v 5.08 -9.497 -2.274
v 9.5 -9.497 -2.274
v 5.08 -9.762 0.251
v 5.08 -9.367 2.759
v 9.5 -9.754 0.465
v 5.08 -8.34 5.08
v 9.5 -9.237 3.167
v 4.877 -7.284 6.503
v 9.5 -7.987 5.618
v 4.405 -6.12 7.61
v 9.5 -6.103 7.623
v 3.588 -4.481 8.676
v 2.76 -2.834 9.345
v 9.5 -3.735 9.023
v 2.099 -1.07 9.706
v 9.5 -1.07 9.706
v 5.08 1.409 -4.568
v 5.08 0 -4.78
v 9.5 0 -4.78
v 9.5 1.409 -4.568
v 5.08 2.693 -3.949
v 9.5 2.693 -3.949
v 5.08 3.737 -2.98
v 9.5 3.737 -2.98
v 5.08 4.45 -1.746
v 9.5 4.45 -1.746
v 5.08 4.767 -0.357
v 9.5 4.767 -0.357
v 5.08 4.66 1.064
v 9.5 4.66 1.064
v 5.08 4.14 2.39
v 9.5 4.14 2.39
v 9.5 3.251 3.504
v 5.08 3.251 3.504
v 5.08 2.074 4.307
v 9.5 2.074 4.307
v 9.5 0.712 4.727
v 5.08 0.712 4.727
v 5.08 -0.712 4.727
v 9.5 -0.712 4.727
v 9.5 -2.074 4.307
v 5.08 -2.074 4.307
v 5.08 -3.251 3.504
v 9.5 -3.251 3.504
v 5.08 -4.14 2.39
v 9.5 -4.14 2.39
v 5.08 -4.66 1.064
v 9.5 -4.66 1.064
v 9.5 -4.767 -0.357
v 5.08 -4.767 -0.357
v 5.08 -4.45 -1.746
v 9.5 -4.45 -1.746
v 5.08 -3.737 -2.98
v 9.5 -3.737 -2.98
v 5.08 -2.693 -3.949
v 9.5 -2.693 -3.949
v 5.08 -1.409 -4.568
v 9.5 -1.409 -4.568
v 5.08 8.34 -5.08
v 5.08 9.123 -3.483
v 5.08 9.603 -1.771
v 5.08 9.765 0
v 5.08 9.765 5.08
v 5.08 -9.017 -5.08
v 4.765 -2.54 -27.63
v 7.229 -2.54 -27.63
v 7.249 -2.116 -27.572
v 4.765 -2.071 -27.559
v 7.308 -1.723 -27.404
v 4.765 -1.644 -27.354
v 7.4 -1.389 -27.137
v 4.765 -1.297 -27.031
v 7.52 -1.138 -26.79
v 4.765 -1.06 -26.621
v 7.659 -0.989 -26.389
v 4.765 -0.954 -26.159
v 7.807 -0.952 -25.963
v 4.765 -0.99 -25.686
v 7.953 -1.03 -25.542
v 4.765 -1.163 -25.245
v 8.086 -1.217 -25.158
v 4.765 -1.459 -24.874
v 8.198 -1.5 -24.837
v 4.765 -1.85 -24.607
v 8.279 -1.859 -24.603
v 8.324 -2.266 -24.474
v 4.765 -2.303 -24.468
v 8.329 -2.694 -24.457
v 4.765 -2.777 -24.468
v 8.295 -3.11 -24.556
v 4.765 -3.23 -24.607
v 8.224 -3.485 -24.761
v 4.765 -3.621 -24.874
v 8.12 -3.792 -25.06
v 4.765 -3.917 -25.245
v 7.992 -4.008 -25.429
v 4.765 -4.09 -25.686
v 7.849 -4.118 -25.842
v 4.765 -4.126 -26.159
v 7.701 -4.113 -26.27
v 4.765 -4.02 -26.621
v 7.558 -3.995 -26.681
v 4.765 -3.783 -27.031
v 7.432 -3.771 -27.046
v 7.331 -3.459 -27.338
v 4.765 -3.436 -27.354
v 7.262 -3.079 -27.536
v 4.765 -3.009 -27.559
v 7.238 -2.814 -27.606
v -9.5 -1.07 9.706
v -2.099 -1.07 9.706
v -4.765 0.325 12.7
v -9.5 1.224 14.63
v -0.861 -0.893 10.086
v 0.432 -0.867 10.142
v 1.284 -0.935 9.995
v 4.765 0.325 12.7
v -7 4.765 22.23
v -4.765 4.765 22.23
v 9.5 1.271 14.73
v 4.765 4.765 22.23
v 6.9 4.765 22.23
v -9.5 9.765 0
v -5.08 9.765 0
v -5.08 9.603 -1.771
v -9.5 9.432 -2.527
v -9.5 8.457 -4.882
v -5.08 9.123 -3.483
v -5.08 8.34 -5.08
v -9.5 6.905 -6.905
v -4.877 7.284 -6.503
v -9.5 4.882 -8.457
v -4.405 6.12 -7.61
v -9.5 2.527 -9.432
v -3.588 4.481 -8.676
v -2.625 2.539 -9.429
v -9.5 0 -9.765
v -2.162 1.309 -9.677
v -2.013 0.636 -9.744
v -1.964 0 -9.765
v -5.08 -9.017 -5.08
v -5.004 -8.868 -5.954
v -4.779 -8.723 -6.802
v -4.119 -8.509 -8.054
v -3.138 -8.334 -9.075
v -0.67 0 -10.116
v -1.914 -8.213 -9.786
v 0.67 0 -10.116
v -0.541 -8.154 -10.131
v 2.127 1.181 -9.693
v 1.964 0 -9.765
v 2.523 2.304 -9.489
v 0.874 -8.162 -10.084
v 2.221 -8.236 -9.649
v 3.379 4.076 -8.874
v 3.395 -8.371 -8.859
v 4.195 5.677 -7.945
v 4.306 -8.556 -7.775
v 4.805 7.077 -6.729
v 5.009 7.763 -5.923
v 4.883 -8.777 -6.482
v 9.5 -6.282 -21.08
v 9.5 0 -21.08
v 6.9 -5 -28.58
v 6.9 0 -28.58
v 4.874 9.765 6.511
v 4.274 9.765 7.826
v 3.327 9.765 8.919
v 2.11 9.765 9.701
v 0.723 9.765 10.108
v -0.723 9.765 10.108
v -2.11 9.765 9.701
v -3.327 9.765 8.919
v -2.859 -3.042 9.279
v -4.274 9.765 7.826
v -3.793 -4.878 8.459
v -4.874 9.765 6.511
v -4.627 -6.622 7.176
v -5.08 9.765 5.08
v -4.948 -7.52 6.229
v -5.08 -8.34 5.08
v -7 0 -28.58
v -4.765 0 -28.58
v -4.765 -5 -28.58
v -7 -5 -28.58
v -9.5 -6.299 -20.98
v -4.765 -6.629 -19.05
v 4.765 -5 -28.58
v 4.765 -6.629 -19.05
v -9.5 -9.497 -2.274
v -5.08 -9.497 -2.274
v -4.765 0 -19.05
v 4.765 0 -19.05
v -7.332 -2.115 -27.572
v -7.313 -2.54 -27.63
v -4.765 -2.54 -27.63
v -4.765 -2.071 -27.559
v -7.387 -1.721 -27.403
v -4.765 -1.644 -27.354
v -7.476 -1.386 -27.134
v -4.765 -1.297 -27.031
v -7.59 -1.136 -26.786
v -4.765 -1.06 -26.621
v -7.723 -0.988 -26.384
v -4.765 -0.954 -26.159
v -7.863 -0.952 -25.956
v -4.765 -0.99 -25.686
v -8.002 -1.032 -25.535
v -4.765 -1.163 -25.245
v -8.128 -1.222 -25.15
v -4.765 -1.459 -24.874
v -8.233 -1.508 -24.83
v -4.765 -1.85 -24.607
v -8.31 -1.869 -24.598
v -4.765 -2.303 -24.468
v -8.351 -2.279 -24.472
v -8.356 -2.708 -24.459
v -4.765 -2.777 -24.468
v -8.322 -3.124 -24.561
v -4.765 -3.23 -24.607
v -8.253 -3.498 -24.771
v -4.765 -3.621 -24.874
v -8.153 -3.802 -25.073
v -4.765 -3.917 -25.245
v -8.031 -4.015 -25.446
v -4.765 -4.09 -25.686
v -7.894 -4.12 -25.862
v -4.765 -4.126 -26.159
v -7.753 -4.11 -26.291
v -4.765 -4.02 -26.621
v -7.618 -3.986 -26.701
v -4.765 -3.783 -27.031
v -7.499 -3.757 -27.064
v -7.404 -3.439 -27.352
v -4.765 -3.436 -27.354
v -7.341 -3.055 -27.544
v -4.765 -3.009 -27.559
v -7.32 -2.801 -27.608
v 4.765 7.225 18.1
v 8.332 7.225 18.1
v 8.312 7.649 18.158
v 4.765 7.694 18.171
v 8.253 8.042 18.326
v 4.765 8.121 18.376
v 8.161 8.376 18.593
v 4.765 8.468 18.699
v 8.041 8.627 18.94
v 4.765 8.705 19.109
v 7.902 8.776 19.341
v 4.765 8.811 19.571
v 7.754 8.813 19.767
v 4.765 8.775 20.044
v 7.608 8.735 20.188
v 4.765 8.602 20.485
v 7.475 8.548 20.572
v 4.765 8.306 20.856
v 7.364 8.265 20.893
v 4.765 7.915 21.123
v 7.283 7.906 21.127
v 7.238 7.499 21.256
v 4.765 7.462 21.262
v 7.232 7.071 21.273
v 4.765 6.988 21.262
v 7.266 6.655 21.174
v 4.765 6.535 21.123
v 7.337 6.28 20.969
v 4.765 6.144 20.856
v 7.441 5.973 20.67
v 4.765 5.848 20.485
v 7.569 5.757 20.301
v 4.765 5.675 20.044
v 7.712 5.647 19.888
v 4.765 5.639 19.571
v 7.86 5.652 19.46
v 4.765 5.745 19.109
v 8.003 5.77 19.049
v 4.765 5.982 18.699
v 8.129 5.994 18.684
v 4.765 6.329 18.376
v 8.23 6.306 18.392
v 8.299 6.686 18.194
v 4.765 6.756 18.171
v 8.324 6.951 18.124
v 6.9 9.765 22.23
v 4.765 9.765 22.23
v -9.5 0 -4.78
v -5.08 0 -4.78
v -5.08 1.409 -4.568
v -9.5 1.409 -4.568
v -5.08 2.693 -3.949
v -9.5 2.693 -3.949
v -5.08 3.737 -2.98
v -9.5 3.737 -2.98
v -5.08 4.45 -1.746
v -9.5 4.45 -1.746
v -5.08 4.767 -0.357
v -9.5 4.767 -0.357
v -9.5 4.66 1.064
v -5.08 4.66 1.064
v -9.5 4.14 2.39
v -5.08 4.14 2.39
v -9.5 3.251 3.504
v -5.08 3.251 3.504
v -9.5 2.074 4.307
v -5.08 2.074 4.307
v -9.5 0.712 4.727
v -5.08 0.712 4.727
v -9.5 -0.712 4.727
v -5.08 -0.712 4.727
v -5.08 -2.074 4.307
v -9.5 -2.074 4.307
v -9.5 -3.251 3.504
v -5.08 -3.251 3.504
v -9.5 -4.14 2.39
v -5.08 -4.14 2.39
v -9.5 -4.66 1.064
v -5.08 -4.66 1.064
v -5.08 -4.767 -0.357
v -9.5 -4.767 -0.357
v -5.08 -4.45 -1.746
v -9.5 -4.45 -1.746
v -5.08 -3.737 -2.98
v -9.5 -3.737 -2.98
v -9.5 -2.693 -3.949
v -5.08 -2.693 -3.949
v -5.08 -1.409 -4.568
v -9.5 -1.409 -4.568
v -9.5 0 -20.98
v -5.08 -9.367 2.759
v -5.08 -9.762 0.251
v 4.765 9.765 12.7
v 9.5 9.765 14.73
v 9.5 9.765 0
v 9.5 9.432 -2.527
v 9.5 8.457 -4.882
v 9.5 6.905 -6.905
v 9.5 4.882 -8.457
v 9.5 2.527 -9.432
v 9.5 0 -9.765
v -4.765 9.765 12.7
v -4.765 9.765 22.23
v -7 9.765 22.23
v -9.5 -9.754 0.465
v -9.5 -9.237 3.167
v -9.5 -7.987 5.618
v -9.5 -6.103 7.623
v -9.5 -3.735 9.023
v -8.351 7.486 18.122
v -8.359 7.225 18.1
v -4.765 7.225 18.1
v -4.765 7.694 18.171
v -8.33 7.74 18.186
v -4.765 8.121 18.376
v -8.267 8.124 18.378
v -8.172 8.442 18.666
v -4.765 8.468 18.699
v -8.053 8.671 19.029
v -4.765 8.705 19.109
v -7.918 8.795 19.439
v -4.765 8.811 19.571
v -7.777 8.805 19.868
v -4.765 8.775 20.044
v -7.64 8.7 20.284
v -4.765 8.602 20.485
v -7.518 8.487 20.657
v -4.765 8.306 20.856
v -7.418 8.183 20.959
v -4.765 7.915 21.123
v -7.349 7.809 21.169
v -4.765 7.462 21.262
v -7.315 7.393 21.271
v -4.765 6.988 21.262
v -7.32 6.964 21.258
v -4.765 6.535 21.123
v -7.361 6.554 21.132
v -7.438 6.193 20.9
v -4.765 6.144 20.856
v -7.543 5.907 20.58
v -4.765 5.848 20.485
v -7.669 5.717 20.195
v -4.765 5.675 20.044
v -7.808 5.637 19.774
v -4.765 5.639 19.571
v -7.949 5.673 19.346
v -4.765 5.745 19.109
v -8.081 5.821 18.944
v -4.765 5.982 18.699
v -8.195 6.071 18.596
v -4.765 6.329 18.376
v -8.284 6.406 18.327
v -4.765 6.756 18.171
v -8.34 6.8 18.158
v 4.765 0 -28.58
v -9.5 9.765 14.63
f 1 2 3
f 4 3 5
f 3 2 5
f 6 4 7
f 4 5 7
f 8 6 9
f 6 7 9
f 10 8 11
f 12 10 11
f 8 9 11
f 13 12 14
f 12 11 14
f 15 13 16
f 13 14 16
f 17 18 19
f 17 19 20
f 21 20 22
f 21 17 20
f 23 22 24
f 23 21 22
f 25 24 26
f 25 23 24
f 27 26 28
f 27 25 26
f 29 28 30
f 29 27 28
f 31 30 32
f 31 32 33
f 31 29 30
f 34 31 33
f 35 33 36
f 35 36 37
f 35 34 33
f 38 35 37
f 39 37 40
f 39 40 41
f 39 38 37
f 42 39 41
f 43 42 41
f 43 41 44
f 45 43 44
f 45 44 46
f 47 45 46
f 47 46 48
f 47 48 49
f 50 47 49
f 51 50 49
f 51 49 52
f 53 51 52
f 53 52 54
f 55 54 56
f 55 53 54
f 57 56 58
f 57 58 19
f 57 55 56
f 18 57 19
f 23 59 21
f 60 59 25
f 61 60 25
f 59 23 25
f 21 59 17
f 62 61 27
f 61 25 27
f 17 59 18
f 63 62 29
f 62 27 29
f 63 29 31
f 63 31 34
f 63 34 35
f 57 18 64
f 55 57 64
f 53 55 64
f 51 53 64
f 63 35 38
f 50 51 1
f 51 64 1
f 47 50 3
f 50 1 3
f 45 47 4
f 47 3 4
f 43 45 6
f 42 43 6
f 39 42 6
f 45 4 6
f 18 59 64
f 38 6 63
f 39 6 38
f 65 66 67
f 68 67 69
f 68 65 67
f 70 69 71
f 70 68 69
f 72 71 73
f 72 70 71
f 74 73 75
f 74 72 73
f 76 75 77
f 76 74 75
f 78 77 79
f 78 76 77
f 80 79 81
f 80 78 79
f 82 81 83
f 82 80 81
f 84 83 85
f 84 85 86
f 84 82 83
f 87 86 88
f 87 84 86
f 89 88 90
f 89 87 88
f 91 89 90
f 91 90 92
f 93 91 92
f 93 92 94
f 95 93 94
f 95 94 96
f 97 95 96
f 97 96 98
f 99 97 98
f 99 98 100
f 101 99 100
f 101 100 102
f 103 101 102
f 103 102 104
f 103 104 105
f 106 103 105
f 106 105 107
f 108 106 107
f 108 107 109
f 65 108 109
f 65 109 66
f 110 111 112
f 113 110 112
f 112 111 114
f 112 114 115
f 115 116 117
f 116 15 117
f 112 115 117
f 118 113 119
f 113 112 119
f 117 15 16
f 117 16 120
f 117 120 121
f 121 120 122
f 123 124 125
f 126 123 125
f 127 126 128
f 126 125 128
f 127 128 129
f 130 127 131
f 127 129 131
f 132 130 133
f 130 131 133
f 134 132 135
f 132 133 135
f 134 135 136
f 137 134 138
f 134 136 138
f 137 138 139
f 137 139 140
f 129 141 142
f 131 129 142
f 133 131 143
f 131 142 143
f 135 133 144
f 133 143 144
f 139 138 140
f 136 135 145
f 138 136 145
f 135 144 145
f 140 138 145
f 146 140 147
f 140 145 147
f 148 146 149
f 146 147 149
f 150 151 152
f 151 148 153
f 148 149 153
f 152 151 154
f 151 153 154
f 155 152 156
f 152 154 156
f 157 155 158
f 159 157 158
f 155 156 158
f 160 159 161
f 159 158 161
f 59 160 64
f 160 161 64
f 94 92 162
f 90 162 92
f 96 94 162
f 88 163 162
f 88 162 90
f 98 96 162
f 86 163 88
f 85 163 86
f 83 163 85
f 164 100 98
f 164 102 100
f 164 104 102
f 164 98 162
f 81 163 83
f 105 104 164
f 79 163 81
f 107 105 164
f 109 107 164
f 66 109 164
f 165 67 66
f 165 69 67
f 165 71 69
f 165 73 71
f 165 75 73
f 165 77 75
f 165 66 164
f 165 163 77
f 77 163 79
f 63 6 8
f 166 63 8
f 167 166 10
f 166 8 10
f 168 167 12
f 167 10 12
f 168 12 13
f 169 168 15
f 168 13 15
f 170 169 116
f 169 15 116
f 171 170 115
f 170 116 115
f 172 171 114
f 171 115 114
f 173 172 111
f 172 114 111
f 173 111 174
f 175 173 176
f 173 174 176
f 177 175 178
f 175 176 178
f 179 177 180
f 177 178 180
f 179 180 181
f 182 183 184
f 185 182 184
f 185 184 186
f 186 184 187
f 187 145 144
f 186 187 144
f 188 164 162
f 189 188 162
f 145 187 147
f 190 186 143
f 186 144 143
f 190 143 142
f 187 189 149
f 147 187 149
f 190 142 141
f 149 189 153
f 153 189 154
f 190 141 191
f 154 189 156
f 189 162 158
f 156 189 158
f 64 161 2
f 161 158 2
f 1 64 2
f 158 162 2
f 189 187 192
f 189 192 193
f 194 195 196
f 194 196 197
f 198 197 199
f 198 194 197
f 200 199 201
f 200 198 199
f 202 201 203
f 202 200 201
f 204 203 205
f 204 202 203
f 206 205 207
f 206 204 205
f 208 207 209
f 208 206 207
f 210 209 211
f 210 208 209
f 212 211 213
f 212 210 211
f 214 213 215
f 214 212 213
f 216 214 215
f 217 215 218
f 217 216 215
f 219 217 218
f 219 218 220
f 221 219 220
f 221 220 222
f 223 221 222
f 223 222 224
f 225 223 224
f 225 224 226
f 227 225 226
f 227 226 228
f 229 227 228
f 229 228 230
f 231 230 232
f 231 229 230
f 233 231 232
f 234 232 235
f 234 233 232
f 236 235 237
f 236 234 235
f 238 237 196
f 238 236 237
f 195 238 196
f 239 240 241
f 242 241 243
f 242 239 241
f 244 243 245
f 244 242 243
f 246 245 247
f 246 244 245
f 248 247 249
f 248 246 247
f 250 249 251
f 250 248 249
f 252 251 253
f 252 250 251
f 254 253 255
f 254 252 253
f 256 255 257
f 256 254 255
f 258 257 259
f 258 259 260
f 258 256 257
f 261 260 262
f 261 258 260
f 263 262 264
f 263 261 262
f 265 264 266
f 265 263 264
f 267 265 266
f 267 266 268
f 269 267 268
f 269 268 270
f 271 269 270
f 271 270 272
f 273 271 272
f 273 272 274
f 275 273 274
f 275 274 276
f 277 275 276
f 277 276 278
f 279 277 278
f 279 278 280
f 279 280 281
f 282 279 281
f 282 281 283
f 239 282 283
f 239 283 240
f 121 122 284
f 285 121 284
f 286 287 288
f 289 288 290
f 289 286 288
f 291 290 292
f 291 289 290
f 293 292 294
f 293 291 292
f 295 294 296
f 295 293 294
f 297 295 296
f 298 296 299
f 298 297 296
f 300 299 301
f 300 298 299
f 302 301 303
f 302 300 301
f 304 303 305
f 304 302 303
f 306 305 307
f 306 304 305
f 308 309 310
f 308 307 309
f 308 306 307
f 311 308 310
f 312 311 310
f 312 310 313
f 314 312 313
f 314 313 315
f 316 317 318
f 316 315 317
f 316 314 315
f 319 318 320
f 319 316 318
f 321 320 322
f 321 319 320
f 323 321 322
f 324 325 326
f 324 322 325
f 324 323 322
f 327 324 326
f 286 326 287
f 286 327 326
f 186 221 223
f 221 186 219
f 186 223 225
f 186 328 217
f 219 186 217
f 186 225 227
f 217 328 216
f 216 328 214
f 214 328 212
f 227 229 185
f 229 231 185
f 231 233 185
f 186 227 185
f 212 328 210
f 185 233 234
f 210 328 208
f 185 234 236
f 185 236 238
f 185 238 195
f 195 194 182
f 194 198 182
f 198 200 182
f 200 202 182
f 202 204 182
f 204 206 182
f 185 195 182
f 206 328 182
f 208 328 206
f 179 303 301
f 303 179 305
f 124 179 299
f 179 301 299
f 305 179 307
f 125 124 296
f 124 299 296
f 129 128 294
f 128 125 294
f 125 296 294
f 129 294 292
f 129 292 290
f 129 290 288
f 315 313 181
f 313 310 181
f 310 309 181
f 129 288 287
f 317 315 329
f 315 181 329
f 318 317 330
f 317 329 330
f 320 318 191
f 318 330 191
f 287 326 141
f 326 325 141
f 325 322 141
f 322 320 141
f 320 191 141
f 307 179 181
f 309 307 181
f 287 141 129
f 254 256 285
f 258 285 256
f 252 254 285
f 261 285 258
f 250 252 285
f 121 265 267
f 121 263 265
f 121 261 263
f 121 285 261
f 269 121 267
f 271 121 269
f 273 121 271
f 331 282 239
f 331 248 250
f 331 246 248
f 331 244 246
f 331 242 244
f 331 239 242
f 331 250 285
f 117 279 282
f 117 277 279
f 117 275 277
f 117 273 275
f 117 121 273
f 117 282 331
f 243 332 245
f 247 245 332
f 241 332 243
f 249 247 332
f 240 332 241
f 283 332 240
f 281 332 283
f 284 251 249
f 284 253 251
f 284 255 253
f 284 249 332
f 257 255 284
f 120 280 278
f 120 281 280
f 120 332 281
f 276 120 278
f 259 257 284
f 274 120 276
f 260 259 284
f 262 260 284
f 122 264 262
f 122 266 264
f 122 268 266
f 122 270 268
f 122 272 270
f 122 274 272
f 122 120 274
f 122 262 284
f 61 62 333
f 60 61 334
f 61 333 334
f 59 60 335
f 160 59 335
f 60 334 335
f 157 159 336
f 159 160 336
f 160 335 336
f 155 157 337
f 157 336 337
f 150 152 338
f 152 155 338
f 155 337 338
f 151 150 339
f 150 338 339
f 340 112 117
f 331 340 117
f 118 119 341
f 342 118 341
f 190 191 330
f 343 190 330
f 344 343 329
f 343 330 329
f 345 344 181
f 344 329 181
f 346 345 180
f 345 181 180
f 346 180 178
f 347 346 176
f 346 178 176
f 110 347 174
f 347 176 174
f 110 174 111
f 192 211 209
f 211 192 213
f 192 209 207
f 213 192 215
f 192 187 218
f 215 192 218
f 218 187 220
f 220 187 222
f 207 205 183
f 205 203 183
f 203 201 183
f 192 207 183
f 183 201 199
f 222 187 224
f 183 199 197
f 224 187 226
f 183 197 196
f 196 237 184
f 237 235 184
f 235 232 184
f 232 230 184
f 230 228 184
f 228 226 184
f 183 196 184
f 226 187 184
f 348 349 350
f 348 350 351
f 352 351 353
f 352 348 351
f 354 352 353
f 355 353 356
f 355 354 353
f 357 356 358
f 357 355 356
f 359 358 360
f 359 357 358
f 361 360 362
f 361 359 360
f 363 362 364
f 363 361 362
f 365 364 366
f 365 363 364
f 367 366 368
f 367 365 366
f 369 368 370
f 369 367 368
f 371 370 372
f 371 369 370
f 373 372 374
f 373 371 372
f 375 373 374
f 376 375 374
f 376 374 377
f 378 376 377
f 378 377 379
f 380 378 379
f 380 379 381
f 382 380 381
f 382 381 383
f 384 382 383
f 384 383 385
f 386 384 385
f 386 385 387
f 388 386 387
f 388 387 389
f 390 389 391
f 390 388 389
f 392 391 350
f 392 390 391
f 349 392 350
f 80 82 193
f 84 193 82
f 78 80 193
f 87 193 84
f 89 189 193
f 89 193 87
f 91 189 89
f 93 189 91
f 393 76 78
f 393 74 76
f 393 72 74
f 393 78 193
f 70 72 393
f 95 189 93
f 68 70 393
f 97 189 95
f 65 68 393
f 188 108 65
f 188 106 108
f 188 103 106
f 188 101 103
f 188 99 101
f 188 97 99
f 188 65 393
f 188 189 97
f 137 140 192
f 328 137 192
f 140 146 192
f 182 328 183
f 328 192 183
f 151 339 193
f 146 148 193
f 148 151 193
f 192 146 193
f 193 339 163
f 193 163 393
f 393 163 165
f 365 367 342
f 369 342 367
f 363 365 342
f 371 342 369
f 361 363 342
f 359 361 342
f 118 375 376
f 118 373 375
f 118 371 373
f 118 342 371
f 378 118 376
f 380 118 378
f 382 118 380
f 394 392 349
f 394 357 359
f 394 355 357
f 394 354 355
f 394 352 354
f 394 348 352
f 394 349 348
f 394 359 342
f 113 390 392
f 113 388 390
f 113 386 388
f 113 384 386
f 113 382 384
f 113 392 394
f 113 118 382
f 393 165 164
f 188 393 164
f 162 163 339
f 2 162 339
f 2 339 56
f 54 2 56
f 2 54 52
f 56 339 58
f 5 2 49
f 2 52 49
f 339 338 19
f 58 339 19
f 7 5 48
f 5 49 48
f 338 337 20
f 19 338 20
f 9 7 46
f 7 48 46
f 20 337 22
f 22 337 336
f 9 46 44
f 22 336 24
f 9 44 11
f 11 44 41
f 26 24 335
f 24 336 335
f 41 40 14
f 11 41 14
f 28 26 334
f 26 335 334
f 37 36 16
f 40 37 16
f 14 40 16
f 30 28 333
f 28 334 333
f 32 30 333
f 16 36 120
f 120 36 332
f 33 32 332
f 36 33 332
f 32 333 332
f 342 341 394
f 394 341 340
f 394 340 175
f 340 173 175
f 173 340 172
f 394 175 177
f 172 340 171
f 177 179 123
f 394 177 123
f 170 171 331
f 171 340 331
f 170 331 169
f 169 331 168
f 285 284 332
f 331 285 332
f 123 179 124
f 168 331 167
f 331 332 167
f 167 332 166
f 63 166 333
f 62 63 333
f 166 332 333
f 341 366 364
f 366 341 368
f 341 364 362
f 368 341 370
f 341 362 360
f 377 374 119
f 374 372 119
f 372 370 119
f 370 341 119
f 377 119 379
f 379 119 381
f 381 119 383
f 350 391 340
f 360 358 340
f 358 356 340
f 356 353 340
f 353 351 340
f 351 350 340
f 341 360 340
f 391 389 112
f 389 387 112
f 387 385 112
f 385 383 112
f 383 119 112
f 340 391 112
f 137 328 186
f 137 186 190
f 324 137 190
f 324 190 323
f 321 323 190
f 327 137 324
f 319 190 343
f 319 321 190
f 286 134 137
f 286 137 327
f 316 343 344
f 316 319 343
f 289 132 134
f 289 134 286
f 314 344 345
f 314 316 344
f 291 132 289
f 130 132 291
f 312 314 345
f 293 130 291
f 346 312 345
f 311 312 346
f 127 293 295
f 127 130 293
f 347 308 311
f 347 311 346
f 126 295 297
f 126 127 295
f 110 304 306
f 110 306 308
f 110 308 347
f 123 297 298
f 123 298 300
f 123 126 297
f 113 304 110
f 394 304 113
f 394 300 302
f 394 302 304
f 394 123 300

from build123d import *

# Parameters (mm, degrees)
SKETCH1_R               = 4.78
BOSS_EXTRUDE1_DEPTH     = 9.5
CUT_EXTRUDE1_DEPTH      = 32.661042702
CUT_EXTRUDE1_DEPTH_BACK = 32.661042702
SKETCH2_W               = 9.53
SKETCH2_H               = 9.53
CUT_EXTRUDE2_DEPTH      = 32.661042763
CUT_EXTRUDE2_DEPTH_BACK = 32.661042763
SKETCH3_R               = 1.59
CHAMFER1_SIZE           = 7.5
CHAMFER1_SIZE_2         = 2.6
CHAMFER2_SIZE           = 2.5
CHAMFER2_SIZE_2         = 7.6


with BuildPart() as part:
    # Sketch1 → Boss-Extrude1 (new, symmetric)
    with BuildSketch(Plane(origin=(0, 0, 0), x_dir=(0, 0, -1), z_dir=(1, 0, 0))):
        with BuildLine():
            Line((9.765, 0), (28.58, 0))
            Line((28.58, 0), (28.58, -5))
            Line((28.58, -5), (2.273512356, -9.496650281))
            ThreePointArc((2.273512356, -9.496650281), (-5.618124367, -7.986983385), (-9.706200338, -1.07))
            Line((-9.706200338, -1.07), (-22.23, 4.765))
            Line((-22.23, 4.765), (-22.23, 9.765))
            Line((-22.23, 9.765), (0, 9.765))
            ThreePointArc((0, 9.765), (6.904897718, 6.904897718), (9.765, 0))
        make_face()
        Circle(SKETCH1_R, mode=Mode.SUBTRACT)
    extrude(amount=BOSS_EXTRUDE1_DEPTH, both=True)

    # Sketch2 → Cut-Extrude1 (cut, two sides: drawn at the far end of the back side and taken through both)
    with BuildSketch(Plane(origin=(0, 0, 0), x_dir=(1, 0, 0), z_dir=(0, 1, 0)).offset(-CUT_EXTRUDE1_DEPTH_BACK)):
        with Locations((0, 23.815)):
            Rectangle(SKETCH2_W, SKETCH2_H)
        with BuildLine():
            Line((5.08, 5.08), (5.08, -5.08))
            ThreePointArc((5.08, -5.08), (0, -10.16), (-5.08, -5.08))
            Line((-5.08, -5.08), (-5.08, 5.08))
            ThreePointArc((-5.08, 5.08), (0, 10.16), (5.08, 5.08))
        make_face()
        with Locations((0, -17.465)):
            Rectangle(SKETCH2_W, SKETCH2_H)
    extrude(amount=CUT_EXTRUDE1_DEPTH + CUT_EXTRUDE1_DEPTH_BACK, mode=Mode.SUBTRACT)

    # Sketch3 → Cut-Extrude2 (cut, two sides: drawn at the far end of the back side and taken through both)
    with BuildSketch(Plane(origin=(0, 0, 0), x_dir=(0, 0, -1), z_dir=(1, 0, 0)).offset(-CUT_EXTRUDE2_DEPTH_BACK)):
        with Locations((-19.69, 7.225)):
            Circle(SKETCH3_R)
        with Locations((26.04, -2.54)):
            Circle(SKETCH3_R)
    extrude(amount=CUT_EXTRUDE2_DEPTH + CUT_EXTRUDE2_DEPTH_BACK, mode=Mode.SUBTRACT)

    # Chamfer1
    # the kernel refuses this chamfer: 7.5, 2.6 mm, written as the material it takes off along each edge
    with BuildSketch(Plane(origin=(9.5, -14.695177751, 22.23), x_dir=(0.01262359546550246, 0, -0.9999203192442502), z_dir=(0, 1, 0)), Plane(origin=(9.5, 19.460177751, -28.58), x_dir=(0.012623595465502456, 0, 0.9999203192442502), z_dir=(0, -1, 0))) as chamfer1_piece_1:
        Polygon((CHAMFER1_SIZE * 0.999920319244, CHAMFER1_SIZE * 0.0126235954655), (-CHAMFER1_SIZE_2 * 0.0126235954655, CHAMFER1_SIZE_2 * 0.999920319244), (0, 0), align=None)
    extrude(amount=43.920355501, mode=Mode.SUBTRACT)

    # Chamfer2
    # the kernel refuses this chamfer: 7.6, 2.5 mm, written as the material it takes off along each edge
    with BuildSketch(Plane(origin=(-9.5, -14.958373363, 22.23), x_dir=(0.9938650173465227, 0, 0.11059985214635677), z_dir=(0, 1, 0))) as chamfer2_piece_1:
        Polygon((CHAMFER2_SIZE * 0.993865017347, CHAMFER2_SIZE * 0.110599852146), (-CHAMFER2_SIZE_2 * 0.110599852146, CHAMFER2_SIZE_2 * 0.993865017347), (0, 0), align=None)
    extrude(amount=44.446746726, mode=Mode.SUBTRACT)
    with BuildSketch(Plane(origin=(-9.5, 19.723373363, -28.58), x_dir=(-0.012040610047615204, 0, 0.9999275092273846), z_dir=(0, -1, 0))) as chamfer2_piece_2:
        Polygon((CHAMFER2_SIZE_2 * 0.999927509227, -CHAMFER2_SIZE_2 * 0.0120406100476), (-CHAMFER2_SIZE * 0.0120406100476, -CHAMFER2_SIZE * 0.999927509227), (0, 0), align=None)
    extrude(amount=44.446746726, mode=Mode.SUBTRACT)


solid = part.part
